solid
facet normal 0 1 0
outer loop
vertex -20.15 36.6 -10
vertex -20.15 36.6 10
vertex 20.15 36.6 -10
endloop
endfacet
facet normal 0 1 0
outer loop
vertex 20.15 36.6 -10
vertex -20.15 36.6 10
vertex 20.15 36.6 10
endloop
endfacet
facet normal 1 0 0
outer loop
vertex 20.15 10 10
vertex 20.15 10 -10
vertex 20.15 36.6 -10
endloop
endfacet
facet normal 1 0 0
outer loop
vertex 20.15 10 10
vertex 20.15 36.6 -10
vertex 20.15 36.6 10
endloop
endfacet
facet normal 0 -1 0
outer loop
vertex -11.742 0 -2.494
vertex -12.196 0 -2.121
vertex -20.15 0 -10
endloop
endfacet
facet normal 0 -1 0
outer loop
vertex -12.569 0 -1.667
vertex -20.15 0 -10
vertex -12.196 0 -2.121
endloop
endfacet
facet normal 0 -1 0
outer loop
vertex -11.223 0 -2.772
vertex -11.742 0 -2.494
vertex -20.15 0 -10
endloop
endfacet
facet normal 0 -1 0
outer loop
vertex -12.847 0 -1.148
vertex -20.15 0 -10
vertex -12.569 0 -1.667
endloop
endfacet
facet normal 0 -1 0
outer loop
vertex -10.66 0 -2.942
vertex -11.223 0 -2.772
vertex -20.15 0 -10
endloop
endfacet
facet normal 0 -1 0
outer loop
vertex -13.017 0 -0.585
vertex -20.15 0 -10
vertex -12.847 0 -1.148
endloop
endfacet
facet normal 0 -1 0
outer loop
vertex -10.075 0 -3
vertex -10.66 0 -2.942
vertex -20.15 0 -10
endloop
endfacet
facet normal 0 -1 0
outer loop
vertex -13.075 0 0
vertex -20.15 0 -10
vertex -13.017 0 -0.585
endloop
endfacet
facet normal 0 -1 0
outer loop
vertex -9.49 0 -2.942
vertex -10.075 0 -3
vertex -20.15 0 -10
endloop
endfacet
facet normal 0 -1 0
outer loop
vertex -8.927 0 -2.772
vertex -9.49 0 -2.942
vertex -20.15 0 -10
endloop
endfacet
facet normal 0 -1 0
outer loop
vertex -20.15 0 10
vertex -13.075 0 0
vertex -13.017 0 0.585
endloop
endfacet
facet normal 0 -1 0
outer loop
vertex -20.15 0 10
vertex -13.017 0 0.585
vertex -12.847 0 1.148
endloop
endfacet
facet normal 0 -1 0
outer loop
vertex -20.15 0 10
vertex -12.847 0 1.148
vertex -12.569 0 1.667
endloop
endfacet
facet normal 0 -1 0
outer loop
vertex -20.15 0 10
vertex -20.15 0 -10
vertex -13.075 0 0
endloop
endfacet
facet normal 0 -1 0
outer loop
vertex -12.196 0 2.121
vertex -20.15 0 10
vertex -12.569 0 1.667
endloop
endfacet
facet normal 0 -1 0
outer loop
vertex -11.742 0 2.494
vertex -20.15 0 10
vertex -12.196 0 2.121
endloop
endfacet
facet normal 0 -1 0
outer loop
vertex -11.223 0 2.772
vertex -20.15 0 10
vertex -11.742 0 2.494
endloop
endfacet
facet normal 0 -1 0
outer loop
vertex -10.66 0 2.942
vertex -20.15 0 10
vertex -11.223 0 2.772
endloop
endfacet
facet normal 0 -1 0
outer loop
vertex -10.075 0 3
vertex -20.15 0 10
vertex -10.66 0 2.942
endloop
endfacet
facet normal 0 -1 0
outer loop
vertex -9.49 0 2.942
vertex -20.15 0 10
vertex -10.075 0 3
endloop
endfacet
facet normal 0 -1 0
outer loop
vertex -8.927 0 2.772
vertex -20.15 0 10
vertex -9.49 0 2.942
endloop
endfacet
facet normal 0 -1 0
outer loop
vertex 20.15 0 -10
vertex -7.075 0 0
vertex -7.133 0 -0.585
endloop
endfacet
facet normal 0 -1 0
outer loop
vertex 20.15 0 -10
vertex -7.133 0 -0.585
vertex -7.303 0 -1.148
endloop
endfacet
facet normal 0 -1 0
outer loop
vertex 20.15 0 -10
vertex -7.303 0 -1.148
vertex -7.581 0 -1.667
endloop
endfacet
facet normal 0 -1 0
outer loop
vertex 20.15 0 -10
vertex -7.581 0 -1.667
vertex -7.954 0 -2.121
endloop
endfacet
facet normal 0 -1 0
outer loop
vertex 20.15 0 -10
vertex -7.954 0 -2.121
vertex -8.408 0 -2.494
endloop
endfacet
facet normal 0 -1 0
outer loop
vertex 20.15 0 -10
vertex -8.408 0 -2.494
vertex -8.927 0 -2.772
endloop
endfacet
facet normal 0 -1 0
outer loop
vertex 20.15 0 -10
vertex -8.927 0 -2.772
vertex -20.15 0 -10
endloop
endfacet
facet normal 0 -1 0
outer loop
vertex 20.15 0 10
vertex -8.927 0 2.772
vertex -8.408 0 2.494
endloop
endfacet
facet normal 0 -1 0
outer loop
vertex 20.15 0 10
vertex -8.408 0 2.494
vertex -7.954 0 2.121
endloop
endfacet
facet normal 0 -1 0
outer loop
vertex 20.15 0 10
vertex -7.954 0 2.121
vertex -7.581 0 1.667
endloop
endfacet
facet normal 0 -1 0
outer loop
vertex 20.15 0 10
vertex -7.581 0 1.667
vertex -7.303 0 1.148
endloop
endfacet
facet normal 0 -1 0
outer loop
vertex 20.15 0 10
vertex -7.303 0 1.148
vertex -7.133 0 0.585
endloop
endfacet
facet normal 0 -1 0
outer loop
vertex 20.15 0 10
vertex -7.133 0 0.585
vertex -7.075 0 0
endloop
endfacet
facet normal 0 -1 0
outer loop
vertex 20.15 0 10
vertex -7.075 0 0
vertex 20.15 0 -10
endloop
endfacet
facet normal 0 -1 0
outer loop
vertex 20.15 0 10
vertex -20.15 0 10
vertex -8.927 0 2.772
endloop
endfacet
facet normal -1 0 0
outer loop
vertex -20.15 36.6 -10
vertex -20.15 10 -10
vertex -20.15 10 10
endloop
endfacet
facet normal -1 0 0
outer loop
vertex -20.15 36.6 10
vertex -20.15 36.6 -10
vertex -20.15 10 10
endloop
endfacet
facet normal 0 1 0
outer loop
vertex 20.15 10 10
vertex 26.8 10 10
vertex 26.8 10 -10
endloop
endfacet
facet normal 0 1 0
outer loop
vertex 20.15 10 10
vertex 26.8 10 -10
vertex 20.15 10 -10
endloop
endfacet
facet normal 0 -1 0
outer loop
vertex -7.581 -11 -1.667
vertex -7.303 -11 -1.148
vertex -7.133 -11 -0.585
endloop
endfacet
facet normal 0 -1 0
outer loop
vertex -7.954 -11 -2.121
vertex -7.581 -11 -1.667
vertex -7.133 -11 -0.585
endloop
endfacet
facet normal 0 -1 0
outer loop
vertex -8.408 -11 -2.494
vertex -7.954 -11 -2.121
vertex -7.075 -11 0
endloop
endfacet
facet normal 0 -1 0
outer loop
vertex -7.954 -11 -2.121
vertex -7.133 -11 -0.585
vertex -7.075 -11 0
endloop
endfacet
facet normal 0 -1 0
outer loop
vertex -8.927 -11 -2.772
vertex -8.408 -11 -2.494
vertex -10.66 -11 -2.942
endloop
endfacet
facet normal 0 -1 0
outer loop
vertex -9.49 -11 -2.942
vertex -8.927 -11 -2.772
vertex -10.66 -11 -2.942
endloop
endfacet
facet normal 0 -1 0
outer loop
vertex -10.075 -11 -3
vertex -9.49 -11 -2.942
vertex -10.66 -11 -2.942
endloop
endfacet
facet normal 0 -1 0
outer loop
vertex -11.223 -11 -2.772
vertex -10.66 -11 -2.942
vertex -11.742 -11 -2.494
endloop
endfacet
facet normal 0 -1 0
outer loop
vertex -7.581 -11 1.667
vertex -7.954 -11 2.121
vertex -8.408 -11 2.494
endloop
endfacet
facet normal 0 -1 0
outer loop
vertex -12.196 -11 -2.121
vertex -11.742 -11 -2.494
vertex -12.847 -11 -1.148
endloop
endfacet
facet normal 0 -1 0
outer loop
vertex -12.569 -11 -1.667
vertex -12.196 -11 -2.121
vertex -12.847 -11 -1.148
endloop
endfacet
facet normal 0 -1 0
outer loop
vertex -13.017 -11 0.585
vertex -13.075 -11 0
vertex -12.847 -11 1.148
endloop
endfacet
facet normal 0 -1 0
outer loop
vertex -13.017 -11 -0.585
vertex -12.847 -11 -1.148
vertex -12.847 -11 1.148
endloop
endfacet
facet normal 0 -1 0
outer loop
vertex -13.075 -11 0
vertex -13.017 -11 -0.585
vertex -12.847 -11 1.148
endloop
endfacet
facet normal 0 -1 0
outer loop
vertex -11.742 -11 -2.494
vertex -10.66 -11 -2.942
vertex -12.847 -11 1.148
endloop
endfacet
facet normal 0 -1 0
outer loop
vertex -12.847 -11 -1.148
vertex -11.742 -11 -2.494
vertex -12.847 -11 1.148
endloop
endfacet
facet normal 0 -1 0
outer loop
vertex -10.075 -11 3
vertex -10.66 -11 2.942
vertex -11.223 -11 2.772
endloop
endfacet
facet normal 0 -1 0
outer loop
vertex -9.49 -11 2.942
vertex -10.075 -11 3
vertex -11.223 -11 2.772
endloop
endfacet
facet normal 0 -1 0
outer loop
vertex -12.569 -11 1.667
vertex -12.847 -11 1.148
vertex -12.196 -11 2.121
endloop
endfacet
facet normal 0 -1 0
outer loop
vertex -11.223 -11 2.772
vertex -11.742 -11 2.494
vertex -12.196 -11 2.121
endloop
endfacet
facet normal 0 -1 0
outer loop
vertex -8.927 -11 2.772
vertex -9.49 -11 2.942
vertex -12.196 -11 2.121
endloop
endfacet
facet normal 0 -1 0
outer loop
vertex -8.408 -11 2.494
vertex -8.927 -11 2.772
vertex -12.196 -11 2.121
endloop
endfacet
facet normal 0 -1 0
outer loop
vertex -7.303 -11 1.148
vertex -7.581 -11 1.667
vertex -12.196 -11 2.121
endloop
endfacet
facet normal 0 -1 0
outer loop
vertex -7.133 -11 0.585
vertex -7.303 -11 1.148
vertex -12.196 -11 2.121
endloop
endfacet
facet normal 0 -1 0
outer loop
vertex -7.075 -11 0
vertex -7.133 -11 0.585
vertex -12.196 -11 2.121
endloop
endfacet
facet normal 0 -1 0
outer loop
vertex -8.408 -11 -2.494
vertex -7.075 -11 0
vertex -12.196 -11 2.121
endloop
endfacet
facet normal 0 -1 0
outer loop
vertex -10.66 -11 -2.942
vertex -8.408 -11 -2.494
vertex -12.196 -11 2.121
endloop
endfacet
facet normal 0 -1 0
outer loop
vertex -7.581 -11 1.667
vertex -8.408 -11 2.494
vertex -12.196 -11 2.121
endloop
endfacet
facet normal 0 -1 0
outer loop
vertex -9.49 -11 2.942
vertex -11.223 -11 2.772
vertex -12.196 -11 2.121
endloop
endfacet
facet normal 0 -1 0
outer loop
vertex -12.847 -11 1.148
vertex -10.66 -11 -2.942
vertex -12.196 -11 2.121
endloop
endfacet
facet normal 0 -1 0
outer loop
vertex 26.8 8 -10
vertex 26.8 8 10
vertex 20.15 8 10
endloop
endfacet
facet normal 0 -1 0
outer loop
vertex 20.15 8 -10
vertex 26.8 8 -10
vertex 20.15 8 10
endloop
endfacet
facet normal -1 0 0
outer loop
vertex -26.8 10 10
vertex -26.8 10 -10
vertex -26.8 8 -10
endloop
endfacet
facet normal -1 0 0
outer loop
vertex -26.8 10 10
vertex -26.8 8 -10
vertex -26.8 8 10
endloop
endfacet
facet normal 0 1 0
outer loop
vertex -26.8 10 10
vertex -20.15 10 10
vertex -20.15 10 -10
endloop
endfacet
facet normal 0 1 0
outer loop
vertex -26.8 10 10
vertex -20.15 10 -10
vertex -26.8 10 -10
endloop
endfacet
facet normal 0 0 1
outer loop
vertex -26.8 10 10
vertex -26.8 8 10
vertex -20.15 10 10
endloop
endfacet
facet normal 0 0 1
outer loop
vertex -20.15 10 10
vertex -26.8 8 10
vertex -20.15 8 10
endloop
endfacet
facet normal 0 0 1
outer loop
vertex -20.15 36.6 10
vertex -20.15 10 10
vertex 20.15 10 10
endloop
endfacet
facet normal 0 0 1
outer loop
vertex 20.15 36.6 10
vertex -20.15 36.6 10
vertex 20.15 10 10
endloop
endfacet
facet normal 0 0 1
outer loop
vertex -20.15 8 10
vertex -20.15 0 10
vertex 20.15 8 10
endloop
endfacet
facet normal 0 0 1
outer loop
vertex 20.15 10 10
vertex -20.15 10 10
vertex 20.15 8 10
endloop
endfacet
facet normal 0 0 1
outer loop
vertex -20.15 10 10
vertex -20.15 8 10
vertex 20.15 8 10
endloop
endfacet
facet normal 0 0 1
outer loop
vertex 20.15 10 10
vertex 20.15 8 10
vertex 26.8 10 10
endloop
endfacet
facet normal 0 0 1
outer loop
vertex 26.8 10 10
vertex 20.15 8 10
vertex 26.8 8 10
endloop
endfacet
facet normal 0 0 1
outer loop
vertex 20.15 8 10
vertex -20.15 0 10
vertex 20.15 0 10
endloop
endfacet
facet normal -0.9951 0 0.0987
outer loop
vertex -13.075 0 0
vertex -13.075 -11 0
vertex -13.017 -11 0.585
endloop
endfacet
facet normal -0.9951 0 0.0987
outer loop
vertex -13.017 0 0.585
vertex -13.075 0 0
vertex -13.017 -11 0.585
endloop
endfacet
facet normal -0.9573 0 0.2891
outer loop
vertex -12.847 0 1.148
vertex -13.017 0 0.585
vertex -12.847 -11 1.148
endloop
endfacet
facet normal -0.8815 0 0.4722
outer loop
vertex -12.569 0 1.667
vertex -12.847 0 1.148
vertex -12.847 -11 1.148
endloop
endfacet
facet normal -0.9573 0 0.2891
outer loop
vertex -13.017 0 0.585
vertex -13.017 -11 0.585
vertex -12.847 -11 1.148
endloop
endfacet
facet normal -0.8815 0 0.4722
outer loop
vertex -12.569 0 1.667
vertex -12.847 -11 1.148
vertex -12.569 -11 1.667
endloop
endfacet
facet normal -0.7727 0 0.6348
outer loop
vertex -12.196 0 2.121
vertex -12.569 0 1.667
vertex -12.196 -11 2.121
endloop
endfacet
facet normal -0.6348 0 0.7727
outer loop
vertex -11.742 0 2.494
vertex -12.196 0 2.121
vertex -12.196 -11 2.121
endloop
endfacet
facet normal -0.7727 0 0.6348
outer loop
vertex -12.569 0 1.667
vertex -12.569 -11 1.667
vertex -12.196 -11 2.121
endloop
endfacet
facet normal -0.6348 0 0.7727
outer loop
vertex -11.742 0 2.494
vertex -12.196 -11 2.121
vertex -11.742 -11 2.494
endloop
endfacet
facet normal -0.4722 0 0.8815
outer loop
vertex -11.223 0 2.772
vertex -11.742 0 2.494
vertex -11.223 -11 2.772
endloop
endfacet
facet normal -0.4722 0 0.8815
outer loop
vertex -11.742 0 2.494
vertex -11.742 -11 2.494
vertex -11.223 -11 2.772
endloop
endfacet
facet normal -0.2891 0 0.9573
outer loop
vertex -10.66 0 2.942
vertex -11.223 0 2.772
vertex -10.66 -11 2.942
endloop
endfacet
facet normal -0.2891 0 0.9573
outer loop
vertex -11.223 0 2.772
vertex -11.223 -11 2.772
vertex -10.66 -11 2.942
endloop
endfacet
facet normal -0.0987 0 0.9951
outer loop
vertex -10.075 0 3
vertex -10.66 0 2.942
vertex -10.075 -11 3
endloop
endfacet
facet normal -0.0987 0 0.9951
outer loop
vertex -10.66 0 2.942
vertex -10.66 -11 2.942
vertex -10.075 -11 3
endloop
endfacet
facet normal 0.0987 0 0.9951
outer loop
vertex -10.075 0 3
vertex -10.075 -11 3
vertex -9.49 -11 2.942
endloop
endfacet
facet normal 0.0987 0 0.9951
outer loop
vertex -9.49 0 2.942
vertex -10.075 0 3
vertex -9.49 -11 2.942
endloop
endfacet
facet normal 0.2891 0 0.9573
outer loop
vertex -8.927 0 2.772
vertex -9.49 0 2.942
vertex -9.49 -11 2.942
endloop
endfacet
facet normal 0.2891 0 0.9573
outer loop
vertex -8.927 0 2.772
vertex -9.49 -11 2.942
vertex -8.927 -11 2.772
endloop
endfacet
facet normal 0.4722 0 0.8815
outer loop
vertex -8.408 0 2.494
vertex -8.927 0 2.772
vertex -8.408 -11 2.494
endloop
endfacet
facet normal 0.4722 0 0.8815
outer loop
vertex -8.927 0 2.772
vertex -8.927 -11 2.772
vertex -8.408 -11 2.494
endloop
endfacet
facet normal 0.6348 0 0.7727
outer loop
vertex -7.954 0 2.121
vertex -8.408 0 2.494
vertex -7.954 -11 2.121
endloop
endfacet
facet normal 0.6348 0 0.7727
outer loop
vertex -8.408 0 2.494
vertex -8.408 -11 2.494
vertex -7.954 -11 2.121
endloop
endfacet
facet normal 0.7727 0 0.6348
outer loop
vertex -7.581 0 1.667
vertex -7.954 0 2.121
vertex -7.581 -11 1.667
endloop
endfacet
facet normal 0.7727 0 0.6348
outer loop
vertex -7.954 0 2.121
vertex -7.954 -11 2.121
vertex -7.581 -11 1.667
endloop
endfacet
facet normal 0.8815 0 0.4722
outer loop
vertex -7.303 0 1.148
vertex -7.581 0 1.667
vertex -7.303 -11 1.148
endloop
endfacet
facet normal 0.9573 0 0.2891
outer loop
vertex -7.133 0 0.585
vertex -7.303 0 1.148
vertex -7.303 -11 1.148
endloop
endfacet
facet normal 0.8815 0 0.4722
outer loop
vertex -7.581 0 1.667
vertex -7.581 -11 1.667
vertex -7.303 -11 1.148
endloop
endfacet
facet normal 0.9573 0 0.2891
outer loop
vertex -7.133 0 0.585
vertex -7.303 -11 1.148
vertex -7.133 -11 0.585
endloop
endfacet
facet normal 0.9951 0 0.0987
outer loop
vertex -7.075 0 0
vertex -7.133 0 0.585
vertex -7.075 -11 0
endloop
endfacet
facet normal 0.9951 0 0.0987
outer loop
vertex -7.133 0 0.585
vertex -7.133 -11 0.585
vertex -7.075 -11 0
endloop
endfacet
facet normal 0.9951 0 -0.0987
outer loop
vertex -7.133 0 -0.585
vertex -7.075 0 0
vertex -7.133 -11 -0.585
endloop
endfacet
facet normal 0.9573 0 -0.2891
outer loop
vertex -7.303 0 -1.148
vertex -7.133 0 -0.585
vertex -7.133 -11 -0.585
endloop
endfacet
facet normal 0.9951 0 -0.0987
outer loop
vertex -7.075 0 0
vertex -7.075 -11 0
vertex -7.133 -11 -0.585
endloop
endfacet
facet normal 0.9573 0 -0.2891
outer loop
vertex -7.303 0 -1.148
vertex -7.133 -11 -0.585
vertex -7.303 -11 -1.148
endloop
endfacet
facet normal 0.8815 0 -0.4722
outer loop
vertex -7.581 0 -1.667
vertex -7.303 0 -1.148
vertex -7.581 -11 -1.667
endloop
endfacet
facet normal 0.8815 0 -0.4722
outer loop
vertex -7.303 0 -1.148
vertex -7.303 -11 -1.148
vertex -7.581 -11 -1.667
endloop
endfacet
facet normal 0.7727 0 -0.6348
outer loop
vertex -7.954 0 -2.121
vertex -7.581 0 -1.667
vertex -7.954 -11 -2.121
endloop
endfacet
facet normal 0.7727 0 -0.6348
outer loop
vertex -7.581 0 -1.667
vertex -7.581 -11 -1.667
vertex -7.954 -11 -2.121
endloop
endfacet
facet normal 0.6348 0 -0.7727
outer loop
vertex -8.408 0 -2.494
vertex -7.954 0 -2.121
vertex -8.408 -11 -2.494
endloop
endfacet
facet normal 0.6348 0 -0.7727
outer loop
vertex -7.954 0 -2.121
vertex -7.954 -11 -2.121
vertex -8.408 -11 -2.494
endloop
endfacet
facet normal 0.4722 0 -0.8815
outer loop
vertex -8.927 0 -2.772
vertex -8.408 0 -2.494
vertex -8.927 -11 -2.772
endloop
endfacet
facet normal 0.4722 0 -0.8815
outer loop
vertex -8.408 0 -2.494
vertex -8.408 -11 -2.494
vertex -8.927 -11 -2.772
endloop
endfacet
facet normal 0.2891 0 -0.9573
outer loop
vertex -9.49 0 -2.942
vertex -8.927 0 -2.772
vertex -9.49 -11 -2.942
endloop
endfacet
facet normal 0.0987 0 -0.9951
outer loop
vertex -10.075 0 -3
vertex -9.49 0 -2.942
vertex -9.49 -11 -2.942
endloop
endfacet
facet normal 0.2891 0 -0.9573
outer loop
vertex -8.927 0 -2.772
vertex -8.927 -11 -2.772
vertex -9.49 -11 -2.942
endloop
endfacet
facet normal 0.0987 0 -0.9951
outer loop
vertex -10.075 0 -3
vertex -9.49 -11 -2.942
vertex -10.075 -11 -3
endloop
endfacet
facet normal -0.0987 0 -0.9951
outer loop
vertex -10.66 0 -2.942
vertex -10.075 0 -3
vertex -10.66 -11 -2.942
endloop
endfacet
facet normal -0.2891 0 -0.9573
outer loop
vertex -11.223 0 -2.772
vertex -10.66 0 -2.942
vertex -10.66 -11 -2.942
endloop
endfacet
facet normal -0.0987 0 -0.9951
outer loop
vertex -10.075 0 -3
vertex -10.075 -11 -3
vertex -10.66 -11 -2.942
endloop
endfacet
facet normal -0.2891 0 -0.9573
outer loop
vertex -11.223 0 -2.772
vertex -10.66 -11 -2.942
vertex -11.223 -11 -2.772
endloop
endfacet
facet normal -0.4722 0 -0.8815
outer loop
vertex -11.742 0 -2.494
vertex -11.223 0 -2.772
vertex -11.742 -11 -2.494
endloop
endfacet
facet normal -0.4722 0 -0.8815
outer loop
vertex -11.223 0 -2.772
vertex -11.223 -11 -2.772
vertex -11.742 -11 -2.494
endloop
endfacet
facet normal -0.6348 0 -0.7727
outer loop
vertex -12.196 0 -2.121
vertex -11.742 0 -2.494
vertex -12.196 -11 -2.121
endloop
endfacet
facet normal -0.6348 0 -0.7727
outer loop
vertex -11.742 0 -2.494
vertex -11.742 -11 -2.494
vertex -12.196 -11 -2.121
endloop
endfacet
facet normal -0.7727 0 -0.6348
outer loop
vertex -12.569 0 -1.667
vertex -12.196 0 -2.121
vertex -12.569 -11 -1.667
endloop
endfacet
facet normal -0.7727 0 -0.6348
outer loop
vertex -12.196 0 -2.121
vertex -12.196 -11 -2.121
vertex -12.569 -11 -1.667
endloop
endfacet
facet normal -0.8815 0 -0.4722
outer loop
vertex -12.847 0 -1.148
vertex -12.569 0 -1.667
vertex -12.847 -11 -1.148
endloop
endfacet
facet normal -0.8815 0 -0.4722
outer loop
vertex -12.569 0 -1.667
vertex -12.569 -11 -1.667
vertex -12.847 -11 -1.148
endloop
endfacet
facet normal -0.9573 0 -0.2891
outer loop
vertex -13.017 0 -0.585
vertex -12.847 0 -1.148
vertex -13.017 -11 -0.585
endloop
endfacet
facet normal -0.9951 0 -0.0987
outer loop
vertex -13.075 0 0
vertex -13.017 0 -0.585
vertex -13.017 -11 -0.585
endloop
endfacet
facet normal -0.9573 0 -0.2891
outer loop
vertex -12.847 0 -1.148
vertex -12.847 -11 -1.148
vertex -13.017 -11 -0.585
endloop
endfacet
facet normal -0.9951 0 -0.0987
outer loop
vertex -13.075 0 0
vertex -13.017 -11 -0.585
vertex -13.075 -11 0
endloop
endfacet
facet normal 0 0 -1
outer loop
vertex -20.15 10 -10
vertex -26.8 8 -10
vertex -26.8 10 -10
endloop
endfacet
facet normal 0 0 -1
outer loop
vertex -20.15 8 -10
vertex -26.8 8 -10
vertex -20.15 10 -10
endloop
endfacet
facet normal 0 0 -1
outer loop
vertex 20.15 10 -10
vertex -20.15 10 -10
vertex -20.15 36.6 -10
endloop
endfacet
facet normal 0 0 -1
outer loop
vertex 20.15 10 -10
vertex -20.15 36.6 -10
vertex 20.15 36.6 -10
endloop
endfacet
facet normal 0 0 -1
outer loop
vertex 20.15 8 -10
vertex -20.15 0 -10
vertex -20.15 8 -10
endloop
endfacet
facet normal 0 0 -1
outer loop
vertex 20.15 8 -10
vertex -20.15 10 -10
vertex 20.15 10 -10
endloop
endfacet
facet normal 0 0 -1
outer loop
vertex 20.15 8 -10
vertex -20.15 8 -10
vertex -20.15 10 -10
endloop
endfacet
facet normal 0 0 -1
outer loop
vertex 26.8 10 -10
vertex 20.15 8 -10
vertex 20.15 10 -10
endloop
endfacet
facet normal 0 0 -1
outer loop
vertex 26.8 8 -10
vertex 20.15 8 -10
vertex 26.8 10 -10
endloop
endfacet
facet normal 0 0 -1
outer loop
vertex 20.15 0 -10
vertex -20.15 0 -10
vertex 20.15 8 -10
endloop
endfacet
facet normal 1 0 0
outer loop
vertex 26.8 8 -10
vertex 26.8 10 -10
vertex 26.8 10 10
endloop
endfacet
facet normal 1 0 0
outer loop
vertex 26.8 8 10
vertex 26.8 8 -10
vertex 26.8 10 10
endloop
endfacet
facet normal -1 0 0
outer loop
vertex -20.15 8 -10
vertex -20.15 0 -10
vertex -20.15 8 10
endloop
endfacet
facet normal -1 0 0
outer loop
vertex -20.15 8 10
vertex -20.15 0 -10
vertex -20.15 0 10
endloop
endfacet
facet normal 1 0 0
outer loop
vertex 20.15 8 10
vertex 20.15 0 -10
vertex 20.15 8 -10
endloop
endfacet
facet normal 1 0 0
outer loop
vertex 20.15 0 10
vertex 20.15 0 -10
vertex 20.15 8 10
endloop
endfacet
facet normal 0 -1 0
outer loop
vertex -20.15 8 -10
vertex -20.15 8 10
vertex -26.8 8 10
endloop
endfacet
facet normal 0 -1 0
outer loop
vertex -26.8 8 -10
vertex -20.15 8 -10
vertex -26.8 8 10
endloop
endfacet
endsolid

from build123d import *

# Parameters (mm, degrees)
F0_W     = 40.3
F0_H     = 20
F1_DEPTH = 36.6
F3_W     = 6.65
F3_H     = 20
F4_DEPTH = 2
F6_R     = 3
F7_DEPTH = 11


with BuildPart() as f1:
    # F0 (on Front) → F1 (new body)
    with BuildSketch(Plane.XZ):
        Rectangle(F0_W, F0_H)
    extrude(amount=-F1_DEPTH)

    # F3 (on offset) → F4 (join)
    with BuildSketch(Plane(origin=(0, 10, 0), x_dir=(-1, 0, 0), z_dir=(0, 1, 0))):
        with Locations((-23.475, 0)):
            Rectangle(F3_W, F3_H)
        with Locations((23.475, 0)):
            Rectangle(F3_W, F3_H)
    extrude(amount=-F4_DEPTH)

    # F6 (on offset) → F7 (join, through all)
    with BuildSketch(Plane(origin=(0, -11, 0), x_dir=(-1, 0, 0), z_dir=(0, 1, 0))):
        with Locations((10.075, 0)):
            Circle(F6_R)
    extrude(amount=F7_DEPTH)


solid = f1.part
